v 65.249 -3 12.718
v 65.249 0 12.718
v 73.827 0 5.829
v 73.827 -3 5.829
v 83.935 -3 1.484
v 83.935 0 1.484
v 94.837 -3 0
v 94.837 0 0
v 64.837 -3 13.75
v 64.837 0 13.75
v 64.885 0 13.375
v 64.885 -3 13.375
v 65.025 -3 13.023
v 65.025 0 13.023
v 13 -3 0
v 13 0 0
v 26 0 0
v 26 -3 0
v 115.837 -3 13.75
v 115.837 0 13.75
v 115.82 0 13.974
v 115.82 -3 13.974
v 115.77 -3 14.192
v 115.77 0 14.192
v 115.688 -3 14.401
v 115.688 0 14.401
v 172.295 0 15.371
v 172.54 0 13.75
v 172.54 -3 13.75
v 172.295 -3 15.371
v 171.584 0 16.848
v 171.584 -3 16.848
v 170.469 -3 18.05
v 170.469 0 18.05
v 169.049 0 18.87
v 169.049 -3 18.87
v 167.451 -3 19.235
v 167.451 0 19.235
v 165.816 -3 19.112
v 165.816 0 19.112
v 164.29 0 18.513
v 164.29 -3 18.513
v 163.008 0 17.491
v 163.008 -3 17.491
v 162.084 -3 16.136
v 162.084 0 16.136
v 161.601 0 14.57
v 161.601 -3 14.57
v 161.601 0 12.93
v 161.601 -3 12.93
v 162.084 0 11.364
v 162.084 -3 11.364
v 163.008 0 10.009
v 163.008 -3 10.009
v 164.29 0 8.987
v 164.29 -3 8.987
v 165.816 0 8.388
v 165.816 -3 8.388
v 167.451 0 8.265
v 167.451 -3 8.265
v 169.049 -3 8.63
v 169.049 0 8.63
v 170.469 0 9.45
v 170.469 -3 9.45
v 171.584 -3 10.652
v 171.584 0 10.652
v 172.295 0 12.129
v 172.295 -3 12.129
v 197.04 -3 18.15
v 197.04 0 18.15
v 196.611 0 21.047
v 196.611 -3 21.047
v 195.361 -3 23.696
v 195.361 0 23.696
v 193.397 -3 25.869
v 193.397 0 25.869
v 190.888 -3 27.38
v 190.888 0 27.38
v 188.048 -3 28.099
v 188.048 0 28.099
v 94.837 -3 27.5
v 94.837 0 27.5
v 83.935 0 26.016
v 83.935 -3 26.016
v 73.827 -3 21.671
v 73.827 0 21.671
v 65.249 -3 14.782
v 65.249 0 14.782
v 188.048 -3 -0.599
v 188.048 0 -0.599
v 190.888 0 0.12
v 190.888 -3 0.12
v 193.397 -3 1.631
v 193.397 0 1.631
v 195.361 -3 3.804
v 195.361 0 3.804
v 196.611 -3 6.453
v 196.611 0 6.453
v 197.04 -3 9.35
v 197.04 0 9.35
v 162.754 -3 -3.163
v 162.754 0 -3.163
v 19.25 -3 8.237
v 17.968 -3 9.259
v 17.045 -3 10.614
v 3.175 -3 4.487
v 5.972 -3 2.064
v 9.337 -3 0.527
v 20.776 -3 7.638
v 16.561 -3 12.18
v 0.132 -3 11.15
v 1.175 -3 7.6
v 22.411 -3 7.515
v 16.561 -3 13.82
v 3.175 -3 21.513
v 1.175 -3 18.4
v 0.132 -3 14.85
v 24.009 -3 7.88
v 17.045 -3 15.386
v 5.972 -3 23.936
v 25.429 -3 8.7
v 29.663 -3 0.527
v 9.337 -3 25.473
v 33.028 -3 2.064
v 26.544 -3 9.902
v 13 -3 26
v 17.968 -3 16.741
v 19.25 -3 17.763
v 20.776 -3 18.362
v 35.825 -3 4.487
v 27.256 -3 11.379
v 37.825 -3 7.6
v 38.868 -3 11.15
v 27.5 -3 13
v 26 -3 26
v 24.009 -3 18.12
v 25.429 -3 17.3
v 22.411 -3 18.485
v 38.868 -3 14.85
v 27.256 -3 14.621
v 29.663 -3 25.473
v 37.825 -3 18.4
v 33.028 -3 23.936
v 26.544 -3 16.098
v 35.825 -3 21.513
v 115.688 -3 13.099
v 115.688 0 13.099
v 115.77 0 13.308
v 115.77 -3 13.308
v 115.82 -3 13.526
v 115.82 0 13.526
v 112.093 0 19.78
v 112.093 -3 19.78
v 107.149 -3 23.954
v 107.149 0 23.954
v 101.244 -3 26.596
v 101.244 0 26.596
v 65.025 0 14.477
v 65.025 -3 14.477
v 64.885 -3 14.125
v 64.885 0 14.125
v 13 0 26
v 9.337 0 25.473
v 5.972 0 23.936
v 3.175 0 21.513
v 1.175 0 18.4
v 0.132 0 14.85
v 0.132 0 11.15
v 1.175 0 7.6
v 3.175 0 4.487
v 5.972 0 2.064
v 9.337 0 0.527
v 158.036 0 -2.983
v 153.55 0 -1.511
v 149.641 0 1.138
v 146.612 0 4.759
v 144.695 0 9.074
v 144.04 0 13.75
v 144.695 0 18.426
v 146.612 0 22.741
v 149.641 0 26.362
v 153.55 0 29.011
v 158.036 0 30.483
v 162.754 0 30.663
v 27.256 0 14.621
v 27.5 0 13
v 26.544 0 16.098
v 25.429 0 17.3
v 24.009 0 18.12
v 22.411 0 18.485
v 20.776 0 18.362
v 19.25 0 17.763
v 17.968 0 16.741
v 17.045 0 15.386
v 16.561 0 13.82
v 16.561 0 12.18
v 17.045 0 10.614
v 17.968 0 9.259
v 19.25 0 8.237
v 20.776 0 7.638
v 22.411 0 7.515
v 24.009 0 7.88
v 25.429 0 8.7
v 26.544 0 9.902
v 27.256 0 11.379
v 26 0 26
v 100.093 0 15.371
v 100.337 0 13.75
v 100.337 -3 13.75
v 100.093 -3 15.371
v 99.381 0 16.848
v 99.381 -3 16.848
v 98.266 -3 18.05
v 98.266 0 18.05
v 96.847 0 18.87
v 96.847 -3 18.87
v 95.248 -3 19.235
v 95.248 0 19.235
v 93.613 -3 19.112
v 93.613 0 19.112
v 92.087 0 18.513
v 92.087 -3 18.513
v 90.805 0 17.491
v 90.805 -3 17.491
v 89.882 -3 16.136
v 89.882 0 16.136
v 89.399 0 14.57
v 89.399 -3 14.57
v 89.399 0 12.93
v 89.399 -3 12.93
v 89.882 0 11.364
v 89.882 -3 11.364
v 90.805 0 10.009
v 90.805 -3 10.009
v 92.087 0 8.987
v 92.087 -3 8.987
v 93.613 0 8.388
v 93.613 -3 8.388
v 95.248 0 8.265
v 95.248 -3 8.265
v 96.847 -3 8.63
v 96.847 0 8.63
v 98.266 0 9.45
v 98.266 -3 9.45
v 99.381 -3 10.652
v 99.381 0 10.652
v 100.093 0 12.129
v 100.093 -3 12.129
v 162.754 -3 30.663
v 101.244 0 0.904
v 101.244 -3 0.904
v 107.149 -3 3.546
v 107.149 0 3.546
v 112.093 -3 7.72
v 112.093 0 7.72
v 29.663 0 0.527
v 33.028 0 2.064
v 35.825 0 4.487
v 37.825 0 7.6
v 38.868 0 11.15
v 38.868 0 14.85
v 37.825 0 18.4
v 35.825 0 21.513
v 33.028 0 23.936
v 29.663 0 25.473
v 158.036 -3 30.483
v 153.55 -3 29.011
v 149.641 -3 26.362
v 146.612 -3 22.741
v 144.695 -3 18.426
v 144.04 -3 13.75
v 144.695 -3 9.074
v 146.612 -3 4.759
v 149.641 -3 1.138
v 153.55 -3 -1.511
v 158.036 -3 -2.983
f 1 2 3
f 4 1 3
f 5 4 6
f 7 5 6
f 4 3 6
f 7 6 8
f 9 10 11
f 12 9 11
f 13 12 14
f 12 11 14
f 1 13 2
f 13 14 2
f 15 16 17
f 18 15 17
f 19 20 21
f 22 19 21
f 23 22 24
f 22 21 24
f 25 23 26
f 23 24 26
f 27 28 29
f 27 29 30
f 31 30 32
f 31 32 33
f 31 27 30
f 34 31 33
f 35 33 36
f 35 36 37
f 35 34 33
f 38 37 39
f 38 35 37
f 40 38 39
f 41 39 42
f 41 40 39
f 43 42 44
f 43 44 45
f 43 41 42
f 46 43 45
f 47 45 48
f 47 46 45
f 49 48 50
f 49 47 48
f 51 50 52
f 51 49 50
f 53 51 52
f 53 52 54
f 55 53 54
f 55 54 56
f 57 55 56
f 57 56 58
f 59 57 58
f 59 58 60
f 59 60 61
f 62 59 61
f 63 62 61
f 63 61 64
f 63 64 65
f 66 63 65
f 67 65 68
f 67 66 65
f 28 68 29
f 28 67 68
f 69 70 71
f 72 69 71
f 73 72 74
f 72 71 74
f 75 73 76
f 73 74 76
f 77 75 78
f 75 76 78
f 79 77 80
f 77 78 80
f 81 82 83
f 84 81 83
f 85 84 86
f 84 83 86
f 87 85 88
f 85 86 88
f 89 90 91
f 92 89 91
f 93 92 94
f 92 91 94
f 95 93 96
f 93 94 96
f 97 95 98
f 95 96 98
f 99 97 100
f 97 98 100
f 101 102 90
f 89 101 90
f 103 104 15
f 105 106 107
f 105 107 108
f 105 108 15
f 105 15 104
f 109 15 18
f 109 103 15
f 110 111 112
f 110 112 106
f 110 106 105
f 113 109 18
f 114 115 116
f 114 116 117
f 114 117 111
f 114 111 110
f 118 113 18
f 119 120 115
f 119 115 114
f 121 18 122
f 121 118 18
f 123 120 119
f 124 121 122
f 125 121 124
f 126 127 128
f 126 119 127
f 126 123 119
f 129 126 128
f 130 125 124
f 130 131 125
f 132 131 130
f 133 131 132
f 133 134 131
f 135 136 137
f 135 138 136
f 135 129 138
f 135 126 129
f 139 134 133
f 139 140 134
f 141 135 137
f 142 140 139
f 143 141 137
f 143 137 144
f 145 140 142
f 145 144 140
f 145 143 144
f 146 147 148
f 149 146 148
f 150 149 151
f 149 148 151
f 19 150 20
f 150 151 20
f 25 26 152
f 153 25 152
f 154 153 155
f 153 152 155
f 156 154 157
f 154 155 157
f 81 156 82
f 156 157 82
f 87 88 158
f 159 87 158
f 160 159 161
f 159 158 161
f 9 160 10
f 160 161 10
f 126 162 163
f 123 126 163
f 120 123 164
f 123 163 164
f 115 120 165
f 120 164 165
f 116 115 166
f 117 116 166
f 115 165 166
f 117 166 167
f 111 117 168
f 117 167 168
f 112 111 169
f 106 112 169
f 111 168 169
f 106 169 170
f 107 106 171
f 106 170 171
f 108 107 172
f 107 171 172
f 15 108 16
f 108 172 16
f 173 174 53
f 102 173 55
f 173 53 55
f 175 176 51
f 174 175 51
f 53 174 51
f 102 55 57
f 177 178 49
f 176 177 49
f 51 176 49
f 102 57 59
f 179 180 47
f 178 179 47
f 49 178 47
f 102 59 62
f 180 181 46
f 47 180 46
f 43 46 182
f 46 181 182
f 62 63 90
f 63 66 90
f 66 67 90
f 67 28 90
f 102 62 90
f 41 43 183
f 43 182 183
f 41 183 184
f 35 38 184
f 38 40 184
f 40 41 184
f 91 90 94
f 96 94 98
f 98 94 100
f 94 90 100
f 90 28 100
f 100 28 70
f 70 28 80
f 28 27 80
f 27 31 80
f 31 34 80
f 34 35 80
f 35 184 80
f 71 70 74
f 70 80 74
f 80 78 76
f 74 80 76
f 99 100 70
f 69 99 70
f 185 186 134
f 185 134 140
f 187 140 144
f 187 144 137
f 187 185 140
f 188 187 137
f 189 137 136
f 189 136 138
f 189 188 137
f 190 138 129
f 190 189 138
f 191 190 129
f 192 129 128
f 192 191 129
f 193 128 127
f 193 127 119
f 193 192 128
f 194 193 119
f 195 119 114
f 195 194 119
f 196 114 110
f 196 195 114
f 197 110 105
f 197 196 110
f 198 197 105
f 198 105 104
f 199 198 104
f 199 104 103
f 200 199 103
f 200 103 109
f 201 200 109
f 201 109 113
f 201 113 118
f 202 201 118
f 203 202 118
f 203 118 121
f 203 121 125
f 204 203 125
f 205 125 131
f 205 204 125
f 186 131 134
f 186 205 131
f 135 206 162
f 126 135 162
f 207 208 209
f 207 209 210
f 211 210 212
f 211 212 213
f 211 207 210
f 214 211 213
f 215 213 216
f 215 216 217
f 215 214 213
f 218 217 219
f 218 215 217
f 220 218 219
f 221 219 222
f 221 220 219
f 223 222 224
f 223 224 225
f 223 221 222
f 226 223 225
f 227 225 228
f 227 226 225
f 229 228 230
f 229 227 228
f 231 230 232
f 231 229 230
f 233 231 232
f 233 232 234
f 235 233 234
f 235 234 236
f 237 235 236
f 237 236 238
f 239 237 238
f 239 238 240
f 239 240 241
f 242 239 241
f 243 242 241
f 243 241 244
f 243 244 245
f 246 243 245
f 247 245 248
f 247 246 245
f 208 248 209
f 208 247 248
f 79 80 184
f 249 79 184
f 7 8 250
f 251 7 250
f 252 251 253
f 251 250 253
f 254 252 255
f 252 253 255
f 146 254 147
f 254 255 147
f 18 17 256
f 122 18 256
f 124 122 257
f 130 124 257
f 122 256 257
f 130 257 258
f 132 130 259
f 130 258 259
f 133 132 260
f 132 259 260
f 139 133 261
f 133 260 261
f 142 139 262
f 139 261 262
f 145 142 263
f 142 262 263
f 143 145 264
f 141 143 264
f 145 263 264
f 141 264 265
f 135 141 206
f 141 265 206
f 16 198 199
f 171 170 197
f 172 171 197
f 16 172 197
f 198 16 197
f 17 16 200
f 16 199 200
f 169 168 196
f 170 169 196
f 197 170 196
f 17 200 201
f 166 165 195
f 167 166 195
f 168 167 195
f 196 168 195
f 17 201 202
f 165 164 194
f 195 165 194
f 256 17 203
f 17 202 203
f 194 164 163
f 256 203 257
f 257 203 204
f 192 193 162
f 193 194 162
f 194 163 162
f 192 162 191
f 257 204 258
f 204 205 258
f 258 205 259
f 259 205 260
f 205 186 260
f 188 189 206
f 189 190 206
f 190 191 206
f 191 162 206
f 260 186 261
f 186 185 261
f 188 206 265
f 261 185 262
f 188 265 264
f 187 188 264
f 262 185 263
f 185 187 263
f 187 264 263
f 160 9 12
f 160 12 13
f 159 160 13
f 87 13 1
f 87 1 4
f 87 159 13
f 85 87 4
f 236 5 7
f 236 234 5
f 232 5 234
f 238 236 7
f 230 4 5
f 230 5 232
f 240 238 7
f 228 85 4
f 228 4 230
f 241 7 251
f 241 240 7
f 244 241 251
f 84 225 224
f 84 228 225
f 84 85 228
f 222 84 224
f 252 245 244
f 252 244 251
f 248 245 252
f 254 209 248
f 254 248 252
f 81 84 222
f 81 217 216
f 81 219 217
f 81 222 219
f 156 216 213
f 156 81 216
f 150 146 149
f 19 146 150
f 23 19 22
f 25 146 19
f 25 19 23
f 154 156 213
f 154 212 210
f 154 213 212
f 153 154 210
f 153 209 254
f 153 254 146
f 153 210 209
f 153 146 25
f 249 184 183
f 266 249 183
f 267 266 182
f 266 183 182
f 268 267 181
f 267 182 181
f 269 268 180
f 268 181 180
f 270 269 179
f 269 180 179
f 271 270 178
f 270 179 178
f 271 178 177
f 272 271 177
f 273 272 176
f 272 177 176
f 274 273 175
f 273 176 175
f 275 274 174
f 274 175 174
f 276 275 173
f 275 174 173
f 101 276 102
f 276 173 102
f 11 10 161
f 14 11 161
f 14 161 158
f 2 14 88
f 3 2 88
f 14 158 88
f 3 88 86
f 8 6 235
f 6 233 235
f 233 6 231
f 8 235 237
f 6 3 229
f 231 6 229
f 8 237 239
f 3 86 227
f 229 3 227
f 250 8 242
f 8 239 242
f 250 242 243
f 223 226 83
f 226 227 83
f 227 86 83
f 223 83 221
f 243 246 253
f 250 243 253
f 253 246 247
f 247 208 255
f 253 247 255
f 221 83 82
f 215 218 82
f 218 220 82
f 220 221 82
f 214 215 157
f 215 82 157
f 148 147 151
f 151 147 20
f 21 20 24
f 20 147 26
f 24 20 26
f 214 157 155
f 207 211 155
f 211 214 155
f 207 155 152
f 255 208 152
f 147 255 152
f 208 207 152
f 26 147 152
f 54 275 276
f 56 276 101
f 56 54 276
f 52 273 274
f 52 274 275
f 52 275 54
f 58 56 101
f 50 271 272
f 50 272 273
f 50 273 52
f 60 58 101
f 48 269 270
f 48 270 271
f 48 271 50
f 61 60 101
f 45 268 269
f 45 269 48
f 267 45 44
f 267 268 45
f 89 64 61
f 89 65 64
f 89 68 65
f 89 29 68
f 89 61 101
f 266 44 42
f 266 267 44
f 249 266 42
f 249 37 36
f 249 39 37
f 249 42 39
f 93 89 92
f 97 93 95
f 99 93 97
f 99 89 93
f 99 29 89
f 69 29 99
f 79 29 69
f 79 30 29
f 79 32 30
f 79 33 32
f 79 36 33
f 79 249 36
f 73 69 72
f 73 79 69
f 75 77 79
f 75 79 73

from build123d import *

# Parameters (mm, degrees)
F0_R     = 5.5
F1_DEPTH = 3


with BuildPart() as f1:
    # F0 (on Front) → F1 (new body)
    with BuildSketch(Plane.XZ):
        with BuildLine():
            ThreePointArc((13, 26), (0, 13), (13, 0))
            Line((13, 0), (26, 0))
            ThreePointArc((26, 0), (39, 13), (26, 26))
            Line((26, 26), (13, 26))
        make_face()
        with Locations((22, 13)):
            Circle(F0_R, mode=Mode.SUBTRACT)
        with BuildLine():
            ThreePointArc((115.688461, 14.40109), (107.149317, 23.953574), (94.837135, 27.5))
            ThreePointArc((94.837135, 27.5), (78.734217, 24.185872), (65.248742, 14.782182))
            ThreePointArc((65.248742, 14.782182), (64.943832, 14.305612), (64.837135, 13.75))
            ThreePointArc((64.837135, 13.75), (64.943832, 13.194388), (65.248742, 12.717818))
            ThreePointArc((65.248742, 12.717818), (78.734217, 3.314128), (94.837135, 0))
            ThreePointArc((94.837135, 0), (107.149317, 3.546426), (115.688461, 13.09891))
            ThreePointArc((115.688461, 13.09891), (115.799495, 13.416075), (115.837135, 13.75))
            ThreePointArc((115.837135, 13.75), (115.799495, 14.083925), (115.688461, 14.40109))
        make_face()
        with Locations((94.837135, 13.75)):
            Circle(F0_R, mode=Mode.SUBTRACT)
        with BuildLine():
            Line((188.048291, 28.099003), (162.754332, 30.663305))
            ThreePointArc((162.754332, 30.663305), (149.641183, 26.362482), (144.039661, 13.75))
            ThreePointArc((144.039661, 13.75), (149.641183, 1.137518), (162.754332, -3.163305))
            Line((162.754332, -3.163305), (188.048291, -0.599003))
            ThreePointArc((188.048291, -0.599003), (194.458768, 2.645013), (197.039661, 9.35))
            Line((197.039661, 9.35), (197.039661, 13.75))
            Line((197.039661, 13.75), (197.039661, 18.15))
            ThreePointArc((197.039661, 18.15), (194.458768, 24.854987), (188.048291, 28.099003))
        make_face()
        with Locations((167.039661, 13.75)):
            Circle(F0_R, mode=Mode.SUBTRACT)
    extrude(amount=F1_DEPTH)


solid = f1.part
